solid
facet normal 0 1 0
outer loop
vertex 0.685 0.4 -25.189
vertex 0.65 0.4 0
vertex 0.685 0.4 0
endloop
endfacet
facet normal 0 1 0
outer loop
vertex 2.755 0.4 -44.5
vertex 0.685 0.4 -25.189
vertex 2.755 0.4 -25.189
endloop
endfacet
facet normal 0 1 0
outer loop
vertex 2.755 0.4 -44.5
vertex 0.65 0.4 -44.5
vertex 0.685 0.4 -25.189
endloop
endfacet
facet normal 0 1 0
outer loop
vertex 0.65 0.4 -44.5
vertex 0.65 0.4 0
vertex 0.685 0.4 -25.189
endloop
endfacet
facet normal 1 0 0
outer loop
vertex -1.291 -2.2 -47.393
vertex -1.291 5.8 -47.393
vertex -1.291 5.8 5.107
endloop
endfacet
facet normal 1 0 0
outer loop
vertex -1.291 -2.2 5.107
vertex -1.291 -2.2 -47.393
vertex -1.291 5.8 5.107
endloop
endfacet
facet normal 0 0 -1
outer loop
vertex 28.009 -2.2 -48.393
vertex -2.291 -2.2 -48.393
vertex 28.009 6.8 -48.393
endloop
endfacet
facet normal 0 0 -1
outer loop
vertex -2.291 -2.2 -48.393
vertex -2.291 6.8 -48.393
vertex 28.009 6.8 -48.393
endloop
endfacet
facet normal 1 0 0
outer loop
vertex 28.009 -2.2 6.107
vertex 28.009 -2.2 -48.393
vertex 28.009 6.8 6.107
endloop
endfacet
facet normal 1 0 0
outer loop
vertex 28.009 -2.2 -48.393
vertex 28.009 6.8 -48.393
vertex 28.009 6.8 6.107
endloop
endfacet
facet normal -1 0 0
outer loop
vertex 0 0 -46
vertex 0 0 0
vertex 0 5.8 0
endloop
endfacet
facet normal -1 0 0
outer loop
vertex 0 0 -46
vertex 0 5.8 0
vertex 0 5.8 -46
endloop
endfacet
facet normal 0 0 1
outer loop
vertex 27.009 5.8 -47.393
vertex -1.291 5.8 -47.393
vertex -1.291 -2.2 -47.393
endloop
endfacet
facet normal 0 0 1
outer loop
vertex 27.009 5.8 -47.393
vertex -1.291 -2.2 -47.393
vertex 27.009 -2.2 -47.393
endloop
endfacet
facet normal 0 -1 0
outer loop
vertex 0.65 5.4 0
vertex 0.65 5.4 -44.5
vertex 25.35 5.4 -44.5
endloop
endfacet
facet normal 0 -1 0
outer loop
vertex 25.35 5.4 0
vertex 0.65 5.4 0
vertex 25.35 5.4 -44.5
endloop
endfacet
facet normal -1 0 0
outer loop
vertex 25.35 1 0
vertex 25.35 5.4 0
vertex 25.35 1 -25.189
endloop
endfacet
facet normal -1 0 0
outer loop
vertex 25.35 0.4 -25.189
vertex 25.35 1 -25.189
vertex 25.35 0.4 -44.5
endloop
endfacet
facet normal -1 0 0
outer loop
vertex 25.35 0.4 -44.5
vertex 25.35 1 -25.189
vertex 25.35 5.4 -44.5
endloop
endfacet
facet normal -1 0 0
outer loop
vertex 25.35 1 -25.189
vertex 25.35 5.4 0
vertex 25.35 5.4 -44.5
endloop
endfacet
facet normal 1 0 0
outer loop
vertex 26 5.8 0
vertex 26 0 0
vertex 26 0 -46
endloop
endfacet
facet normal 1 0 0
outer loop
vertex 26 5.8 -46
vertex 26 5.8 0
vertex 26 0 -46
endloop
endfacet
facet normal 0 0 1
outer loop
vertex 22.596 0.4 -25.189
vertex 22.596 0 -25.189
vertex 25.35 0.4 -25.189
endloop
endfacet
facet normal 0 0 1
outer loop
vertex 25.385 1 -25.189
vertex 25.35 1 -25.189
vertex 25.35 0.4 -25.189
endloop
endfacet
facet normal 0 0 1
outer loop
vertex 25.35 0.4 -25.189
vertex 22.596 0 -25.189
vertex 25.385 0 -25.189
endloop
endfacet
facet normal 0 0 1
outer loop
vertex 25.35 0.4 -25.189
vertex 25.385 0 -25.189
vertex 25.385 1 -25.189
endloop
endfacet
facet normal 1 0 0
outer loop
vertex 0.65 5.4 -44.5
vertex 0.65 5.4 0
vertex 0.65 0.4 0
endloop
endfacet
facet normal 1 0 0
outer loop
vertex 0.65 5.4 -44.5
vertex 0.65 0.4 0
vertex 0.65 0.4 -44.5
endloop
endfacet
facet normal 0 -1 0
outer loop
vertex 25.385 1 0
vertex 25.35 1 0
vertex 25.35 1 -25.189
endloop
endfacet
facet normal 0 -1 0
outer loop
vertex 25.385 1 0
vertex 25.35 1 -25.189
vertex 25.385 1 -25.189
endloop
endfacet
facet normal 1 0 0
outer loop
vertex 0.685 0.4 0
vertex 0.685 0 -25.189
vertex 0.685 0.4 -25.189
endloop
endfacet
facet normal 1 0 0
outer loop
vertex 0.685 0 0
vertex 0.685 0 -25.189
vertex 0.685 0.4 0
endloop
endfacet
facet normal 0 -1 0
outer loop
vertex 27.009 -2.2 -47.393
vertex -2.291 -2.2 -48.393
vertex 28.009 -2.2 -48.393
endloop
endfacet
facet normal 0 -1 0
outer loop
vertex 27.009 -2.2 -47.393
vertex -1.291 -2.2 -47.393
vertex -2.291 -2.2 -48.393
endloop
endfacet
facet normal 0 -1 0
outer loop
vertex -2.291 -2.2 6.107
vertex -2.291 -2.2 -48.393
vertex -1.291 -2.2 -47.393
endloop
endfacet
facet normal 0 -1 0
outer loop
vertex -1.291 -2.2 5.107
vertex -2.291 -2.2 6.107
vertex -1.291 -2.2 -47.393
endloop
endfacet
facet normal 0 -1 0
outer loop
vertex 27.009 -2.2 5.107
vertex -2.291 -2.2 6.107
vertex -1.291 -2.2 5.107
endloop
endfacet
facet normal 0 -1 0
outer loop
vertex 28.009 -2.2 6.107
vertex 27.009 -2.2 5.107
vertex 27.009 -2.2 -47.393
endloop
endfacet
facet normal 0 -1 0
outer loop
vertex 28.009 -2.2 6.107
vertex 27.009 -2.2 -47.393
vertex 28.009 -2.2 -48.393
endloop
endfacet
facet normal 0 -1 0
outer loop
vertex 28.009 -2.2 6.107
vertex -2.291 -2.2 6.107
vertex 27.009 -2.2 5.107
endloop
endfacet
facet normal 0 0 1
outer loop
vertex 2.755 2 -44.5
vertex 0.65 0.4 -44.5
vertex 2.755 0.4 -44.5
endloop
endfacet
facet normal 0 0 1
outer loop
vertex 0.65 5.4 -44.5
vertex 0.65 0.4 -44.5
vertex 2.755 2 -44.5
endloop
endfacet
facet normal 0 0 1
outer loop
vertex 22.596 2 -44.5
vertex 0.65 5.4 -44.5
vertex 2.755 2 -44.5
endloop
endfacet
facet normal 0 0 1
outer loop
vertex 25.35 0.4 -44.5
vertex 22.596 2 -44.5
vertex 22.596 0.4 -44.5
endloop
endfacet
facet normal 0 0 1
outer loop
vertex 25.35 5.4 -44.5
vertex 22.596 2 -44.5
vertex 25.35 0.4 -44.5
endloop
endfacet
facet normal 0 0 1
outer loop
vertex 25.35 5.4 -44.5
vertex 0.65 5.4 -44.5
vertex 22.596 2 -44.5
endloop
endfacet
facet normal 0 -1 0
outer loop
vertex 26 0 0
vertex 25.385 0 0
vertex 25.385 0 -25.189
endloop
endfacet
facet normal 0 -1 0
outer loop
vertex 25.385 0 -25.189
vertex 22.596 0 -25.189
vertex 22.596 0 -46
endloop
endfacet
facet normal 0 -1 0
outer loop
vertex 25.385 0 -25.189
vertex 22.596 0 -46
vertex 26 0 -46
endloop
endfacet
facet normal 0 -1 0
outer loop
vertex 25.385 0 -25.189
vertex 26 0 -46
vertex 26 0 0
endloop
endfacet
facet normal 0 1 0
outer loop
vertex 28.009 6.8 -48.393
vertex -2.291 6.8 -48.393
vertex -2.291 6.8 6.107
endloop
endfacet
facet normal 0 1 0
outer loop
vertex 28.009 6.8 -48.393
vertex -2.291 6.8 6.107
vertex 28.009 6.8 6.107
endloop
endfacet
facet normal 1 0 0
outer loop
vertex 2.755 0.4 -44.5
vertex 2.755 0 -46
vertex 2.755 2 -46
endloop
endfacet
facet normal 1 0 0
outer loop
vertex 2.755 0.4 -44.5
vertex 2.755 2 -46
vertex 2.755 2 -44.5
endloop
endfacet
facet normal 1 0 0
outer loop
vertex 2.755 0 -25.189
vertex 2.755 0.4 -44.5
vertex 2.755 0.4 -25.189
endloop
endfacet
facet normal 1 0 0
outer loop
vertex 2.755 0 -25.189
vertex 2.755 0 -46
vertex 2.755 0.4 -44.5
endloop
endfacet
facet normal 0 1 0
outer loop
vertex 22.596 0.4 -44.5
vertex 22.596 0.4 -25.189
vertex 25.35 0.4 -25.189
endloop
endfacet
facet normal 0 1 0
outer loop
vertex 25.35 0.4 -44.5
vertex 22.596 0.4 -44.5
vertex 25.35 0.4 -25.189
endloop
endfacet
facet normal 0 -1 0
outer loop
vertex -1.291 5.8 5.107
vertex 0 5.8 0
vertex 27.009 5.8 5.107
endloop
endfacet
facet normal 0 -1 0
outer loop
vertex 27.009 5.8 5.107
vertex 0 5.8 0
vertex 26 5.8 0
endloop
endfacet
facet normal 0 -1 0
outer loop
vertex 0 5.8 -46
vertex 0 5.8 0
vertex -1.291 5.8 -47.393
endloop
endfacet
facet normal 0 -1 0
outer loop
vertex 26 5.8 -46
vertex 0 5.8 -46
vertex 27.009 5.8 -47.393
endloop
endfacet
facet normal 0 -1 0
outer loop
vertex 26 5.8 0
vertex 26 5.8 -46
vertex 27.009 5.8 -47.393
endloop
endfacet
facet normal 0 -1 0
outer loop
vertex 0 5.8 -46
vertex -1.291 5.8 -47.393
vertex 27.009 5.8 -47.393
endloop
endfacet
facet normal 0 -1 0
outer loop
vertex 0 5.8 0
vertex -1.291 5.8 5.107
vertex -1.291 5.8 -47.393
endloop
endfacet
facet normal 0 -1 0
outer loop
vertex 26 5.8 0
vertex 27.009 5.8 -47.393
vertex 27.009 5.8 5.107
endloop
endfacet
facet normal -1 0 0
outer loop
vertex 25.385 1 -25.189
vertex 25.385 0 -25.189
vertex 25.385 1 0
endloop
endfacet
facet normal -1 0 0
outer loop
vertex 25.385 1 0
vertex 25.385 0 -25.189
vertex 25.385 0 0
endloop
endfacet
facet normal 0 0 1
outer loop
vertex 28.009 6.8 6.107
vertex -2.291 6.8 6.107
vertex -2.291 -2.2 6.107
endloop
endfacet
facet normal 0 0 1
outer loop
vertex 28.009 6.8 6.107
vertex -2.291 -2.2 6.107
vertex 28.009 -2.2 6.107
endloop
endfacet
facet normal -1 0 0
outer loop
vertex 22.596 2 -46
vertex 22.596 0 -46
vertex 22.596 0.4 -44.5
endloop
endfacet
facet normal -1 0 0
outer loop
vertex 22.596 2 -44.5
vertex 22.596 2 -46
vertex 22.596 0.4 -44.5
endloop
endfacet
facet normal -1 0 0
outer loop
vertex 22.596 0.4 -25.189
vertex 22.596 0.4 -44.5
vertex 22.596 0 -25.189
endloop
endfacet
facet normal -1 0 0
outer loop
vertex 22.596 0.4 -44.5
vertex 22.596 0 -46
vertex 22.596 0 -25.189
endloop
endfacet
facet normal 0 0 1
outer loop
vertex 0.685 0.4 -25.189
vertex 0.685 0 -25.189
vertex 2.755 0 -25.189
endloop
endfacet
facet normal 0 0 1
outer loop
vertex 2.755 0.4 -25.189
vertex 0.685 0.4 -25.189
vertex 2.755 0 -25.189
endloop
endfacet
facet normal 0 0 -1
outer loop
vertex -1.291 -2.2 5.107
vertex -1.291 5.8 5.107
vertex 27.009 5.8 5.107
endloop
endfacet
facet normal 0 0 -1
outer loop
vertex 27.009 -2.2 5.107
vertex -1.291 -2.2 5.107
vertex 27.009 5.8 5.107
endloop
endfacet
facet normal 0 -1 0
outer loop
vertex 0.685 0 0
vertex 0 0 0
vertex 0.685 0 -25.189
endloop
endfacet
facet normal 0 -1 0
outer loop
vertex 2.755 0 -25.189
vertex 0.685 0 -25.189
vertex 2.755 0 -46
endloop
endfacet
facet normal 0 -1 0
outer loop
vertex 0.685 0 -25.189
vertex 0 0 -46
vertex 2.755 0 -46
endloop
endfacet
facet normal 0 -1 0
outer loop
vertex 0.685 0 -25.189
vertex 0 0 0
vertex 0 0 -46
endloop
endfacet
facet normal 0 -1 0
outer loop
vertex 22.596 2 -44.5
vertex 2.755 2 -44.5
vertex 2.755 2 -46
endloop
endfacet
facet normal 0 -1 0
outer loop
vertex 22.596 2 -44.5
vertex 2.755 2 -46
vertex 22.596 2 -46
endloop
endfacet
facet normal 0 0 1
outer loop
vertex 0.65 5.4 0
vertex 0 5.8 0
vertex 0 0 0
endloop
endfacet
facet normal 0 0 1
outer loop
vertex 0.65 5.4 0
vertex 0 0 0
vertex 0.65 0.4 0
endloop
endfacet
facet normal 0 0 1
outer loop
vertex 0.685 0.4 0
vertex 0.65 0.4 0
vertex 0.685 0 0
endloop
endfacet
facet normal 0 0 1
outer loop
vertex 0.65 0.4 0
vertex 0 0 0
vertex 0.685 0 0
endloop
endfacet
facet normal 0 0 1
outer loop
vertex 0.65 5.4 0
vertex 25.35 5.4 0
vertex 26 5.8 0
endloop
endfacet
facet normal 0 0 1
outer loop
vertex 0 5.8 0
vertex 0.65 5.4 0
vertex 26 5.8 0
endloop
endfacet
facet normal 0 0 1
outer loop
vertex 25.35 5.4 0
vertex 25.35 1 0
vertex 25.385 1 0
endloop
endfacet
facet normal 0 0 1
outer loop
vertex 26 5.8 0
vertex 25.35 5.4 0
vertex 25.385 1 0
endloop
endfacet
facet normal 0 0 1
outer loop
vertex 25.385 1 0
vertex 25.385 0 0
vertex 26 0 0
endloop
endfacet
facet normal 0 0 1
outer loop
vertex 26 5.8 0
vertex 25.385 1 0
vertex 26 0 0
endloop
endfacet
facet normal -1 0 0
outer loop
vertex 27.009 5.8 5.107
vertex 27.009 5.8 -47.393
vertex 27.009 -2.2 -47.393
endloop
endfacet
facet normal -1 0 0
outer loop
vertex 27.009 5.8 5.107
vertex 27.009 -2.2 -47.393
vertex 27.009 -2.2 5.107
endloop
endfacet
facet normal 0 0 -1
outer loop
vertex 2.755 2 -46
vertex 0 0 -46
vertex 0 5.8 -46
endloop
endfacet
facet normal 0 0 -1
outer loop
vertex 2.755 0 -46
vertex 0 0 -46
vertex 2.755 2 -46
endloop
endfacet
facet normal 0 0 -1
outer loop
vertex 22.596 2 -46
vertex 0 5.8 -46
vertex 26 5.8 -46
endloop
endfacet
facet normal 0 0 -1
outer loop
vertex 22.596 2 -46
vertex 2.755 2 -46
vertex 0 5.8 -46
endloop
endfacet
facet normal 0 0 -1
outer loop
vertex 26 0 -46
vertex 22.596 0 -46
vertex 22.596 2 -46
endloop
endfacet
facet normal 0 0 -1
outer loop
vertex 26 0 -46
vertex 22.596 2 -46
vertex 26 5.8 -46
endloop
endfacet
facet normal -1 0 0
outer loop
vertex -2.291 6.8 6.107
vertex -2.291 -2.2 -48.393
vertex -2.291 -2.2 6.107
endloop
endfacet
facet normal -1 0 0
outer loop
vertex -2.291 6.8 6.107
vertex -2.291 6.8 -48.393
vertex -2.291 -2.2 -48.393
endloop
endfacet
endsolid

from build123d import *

# Parameters (mm, degrees)
SKETCH1_W           = 26
SKETCH1_H           = 46
BOSS_EXTRUDE1_DEPTH = 5.8
CUT_EXTRUDE1_START  = -0.4
SKETCH2_W           = 24.7
SKETCH2_H           = 45
CUT_EXTRUDE1_DEPTH  = 5
SKETCH3_W           = 30.3
SKETCH3_H           = 54.5
BOSS_EXTRUDE2_DEPTH = 1
SKETCH4_W           = 1
SKETCH4_H           = 54.5
BOSS_EXTRUDE3_DEPTH = 8
SKETCH5_W           = 29.3
SKETCH5_H           = 1
BOSS_EXTRUDE4_DEPTH = 8
SKETCH6_W           = 1
SKETCH6_H           = 53.5
BOSS_EXTRUDE5_DEPTH = 8
SKETCH7_W           = 28.3
SKETCH7_H           = 1
BOSS_EXTRUDE6_DEPTH = 8
SKETCH8_W           = 19.840922592
SKETCH8_H           = 47.393191015
CUT_EXTRUDE2_DEPTH  = 2
SKETCH9_W           = 24.7
SKETCH9_H           = 25.217114116
CUT_EXTRUDE3_DEPTH  = 1


with BuildPart() as part:
    # Sketch1 → Boss-Extrude1 (new body)
    with BuildSketch(Plane(origin=(0, 0, 0), x_dir=(1, 0, 0), z_dir=(0, 1, 0))):
        with Locations((13, 23)):
            Rectangle(SKETCH1_W, SKETCH1_H)
    extrude(amount=BOSS_EXTRUDE1_DEPTH)

    # Sketch2 → Cut-Extrude1 (cut)
    with BuildSketch(Plane(origin=(0, 5.8, 0), x_dir=(1, 0, 0), z_dir=(0, 1, 0)).offset(CUT_EXTRUDE1_START)):
        with Locations((13, 22)):
            Rectangle(SKETCH2_W, SKETCH2_H)
    extrude(amount=-CUT_EXTRUDE1_DEPTH, mode=Mode.SUBTRACT)

    # Sketch3 → Boss-Extrude2 (add)
    with BuildSketch(Plane(origin=(0, 5.8, 0), x_dir=(1, 0, 0), z_dir=(0, 1, 0))):
        with Locations((12.858896044, 21.143191015)):
            Rectangle(SKETCH3_W, SKETCH3_H)
    extrude(amount=BOSS_EXTRUDE2_DEPTH)

    # Sketch4 → Boss-Extrude3 (add)
    with BuildSketch(Plane.XZ.offset(-5.8)):
        with Locations((-1.791103956, -21.143191015)):
            Rectangle(SKETCH4_W, SKETCH4_H)
    extrude(amount=BOSS_EXTRUDE3_DEPTH)

    # Sketch5 → Boss-Extrude4 (add)
    with BuildSketch(Plane.XZ.offset(-5.8)):
        with Locations((13.358896044, 5.606808985)):
            Rectangle(SKETCH5_W, SKETCH5_H)
    extrude(amount=BOSS_EXTRUDE4_DEPTH)

    # Sketch6 → Boss-Extrude5 (add)
    with BuildSketch(Plane.XZ.offset(-5.8)):
        with Locations((27.508896044, -21.643191015)):
            Rectangle(SKETCH6_W, SKETCH6_H)
    extrude(amount=BOSS_EXTRUDE5_DEPTH)

    # Sketch7 → Boss-Extrude6 (add)
    with BuildSketch(Plane.XZ.offset(-5.8)):
        with Locations((12.858896044, -47.893191015)):
            Rectangle(SKETCH7_W, SKETCH7_H)
    extrude(amount=BOSS_EXTRUDE6_DEPTH)

    # Sketch8 → Cut-Extrude2 (cut)
    with BuildSketch(Plane.XZ):
        with Locations((12.675861703, -23.696595508)):
            Rectangle(SKETCH8_W, SKETCH8_H)
    extrude(amount=-CUT_EXTRUDE2_DEPTH, mode=Mode.SUBTRACT)

    # Sketch9 → Cut-Extrude3 (cut)
    with BuildSketch(Plane.XZ):
        with Locations((13.034968762, -12.580450922)):
            Rectangle(SKETCH9_W, SKETCH9_H)
    extrude(amount=-CUT_EXTRUDE3_DEPTH, mode=Mode.SUBTRACT)


solid = part.part
